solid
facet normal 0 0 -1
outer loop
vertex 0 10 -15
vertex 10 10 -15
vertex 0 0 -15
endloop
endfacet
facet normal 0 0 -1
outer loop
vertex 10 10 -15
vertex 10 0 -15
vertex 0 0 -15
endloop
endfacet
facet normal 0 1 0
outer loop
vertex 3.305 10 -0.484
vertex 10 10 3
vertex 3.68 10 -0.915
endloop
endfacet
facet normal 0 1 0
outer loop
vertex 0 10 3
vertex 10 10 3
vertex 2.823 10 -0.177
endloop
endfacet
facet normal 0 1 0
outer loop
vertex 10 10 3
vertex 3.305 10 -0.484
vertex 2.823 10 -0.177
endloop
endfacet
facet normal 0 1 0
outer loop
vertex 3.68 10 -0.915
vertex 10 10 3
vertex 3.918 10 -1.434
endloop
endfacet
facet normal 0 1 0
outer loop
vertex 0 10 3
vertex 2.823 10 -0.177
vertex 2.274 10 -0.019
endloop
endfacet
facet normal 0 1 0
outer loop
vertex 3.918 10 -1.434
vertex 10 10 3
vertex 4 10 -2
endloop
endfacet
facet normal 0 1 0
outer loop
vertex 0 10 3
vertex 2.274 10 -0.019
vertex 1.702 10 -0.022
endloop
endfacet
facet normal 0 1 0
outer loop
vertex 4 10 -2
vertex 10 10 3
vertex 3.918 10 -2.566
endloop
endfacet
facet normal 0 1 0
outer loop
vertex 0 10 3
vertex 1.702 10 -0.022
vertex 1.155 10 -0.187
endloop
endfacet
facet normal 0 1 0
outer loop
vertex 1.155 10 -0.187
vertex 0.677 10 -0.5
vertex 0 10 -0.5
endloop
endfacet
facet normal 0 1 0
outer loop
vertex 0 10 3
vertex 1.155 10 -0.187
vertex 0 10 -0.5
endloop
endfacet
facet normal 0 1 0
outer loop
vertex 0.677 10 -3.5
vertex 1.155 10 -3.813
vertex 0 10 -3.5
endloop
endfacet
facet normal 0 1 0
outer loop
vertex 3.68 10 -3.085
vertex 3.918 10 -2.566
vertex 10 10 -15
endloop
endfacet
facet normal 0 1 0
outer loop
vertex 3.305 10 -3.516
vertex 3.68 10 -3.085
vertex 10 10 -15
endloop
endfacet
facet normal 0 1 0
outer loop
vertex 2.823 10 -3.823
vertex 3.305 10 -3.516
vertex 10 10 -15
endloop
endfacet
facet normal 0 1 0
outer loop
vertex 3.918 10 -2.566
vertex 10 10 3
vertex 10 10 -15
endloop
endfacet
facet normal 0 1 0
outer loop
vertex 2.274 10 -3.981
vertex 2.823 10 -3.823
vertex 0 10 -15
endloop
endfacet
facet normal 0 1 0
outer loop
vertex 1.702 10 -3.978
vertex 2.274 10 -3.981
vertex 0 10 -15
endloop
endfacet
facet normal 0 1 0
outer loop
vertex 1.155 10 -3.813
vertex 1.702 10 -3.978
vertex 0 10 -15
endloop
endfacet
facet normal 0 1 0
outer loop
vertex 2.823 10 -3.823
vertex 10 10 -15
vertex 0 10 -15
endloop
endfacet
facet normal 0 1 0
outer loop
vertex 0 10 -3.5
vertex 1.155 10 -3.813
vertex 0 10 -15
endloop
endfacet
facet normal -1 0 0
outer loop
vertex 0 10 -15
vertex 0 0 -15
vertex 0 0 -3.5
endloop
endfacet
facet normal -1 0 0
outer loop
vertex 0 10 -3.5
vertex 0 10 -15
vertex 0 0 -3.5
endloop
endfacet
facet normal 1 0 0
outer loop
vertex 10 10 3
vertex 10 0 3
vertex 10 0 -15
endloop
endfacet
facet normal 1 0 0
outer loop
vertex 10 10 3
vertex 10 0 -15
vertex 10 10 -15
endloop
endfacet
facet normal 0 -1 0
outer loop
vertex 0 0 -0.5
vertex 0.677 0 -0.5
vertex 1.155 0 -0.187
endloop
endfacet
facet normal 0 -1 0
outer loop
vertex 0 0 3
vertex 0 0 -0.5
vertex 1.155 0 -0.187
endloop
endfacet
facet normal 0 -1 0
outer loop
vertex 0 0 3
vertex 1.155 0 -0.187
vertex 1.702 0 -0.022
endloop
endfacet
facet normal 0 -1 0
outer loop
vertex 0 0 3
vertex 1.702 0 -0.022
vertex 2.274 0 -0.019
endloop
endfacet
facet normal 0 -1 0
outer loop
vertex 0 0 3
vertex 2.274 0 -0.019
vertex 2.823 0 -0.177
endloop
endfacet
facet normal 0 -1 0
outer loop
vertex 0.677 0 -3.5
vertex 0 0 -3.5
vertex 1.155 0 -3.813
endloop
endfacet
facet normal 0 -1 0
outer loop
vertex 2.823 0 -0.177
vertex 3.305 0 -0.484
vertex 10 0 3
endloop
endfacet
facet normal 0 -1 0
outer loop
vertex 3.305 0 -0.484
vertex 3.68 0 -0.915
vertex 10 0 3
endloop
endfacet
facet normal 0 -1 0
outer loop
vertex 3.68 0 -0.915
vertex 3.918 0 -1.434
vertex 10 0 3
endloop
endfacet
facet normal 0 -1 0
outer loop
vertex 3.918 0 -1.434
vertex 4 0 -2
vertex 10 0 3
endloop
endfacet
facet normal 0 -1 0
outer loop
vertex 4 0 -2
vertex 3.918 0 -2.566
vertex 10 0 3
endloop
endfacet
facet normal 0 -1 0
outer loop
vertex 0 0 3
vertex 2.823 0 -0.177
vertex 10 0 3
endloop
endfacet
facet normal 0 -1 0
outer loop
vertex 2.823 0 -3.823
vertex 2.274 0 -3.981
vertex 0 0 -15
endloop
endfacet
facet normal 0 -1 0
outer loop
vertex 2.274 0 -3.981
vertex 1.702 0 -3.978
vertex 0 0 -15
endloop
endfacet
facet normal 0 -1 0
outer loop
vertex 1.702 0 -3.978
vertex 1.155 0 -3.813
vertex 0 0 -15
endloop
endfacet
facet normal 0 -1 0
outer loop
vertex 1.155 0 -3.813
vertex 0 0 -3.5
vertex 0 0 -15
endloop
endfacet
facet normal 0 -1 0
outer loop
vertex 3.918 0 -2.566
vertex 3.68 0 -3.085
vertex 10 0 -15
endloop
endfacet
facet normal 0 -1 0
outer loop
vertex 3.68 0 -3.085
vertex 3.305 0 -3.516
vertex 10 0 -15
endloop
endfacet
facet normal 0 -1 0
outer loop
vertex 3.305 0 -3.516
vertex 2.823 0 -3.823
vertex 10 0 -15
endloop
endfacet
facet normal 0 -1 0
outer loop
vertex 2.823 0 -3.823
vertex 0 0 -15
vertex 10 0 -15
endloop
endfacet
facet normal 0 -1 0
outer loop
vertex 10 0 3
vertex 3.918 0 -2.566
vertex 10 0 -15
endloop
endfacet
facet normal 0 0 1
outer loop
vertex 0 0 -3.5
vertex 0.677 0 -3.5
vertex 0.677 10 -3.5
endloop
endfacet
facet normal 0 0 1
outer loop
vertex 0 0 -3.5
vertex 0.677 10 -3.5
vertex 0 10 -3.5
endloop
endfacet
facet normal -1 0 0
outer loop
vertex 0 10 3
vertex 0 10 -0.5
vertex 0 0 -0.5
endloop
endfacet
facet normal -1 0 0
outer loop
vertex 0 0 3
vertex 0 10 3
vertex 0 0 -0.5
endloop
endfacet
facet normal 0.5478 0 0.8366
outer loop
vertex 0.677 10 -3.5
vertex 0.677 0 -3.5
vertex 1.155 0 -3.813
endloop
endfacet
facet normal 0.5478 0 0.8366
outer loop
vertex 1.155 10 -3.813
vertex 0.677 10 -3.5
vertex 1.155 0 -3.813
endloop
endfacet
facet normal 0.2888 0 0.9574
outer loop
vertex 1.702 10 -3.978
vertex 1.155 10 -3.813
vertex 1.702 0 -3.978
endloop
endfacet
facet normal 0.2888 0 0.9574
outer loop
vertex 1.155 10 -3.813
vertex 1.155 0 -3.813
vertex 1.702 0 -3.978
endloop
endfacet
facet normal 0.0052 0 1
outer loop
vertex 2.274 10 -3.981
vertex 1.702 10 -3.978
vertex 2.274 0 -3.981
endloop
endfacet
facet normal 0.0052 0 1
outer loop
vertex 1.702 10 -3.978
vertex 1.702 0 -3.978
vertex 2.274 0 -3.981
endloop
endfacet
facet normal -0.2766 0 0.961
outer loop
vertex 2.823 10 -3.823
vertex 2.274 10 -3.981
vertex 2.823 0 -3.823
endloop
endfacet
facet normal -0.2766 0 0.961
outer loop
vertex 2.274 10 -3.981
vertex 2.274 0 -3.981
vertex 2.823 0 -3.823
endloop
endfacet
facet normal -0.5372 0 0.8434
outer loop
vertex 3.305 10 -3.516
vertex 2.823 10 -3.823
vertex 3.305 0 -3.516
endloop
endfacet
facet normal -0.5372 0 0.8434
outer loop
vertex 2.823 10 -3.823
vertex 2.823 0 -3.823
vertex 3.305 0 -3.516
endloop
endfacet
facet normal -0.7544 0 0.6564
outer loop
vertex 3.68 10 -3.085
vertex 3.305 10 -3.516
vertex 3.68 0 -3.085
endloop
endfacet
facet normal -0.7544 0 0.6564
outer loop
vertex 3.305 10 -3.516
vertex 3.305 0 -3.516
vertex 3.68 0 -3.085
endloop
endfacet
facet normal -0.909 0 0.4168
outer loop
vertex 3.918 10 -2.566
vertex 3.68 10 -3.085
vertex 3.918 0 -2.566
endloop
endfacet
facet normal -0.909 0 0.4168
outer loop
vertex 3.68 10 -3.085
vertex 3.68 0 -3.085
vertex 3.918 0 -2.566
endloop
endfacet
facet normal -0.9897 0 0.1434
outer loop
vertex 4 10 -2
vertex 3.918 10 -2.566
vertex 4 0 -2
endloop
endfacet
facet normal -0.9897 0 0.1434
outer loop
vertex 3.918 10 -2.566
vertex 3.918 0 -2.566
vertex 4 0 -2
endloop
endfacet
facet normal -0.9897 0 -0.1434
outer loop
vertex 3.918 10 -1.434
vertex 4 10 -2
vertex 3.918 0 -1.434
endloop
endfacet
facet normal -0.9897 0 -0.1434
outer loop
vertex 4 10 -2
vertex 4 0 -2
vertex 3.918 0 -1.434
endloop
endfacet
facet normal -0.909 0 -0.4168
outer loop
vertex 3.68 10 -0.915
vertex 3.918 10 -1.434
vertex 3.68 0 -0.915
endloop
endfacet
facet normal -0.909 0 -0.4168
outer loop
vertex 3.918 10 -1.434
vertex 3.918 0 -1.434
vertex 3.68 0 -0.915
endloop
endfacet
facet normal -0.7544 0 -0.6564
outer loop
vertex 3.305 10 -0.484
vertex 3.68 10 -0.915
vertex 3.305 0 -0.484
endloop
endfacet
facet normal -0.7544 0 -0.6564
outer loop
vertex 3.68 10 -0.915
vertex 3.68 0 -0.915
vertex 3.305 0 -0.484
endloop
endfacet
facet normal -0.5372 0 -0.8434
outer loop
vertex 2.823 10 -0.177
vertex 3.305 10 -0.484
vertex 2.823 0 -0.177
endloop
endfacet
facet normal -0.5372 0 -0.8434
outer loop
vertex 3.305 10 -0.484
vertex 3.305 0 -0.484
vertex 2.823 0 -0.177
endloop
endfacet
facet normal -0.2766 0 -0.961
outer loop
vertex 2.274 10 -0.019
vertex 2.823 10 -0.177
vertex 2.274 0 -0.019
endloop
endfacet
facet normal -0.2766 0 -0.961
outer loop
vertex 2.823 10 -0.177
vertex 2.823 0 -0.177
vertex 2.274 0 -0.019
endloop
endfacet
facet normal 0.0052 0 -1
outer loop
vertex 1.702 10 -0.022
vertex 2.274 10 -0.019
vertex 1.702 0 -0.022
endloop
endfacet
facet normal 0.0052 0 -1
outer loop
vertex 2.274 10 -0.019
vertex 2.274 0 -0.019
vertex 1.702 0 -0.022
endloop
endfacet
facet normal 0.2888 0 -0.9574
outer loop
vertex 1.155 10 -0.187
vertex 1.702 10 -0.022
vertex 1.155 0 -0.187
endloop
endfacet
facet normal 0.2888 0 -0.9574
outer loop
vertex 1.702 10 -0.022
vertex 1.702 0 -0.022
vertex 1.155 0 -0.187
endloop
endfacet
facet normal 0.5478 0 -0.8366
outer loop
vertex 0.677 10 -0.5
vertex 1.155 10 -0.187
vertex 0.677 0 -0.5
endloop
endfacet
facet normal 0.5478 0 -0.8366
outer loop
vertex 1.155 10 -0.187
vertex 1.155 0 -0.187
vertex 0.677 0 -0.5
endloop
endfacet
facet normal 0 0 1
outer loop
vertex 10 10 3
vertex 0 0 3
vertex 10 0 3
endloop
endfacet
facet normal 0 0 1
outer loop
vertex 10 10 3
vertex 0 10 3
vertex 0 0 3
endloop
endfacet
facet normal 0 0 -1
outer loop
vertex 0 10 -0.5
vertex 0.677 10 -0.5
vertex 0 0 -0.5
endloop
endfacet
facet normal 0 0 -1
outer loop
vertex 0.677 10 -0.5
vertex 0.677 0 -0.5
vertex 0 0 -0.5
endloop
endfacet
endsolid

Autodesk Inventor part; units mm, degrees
ref_plane "YZ Plane" through (0, 0, 0) normal (1, 0, 0) x (0, 1, 0)
ref_plane "XZ Plane" through (0, 0, 0) normal (0, 1, 0) x (-1, 0, 0)
ref_plane "XY Plane" through (0, 0, 0) normal (0, 0, 1) x (1, 0, 0)
sketch "Sketch1" plane through (0, 0, 0) normal (0, 1, 0) x (-1, 0, 0)
  point P0 (0, 0)
sketch "Sketch2" plane through (0, 0, 0) normal (0, 1, 0) x (-1, 0, 0)
  line L0 (0, 0) -> (-5, 0)
  line L1 (-5, 0) -> (-5, -4)
  line L2 (-5, -4) -> (0, -4)
  line L3 (0, -4) -> (0, 0)
  line L4 (0, 0) -> (-10, 0)
  line L5 (-10, 0) -> (-10, -15)
  line L6 (-10, -15) -> (0, -15)
  line L7 (0, -15) -> (0, 0)
  circle A0 centre (-2, -2) radius 2
  line L8 (-5, 0) -> (-2, 0)
  line L9 (-2, 0) -> (-2, -4)
  line L10 (-2, -4) -> (-5, -4)
  line L11 (-5, -4) -> (-5, 0)
  point P0 (0, -2)
  dimension "d0" = 5
  dimension "d1" = 4
  dimension "d2" = 10
  dimension "d3" = 15
sketch "Sketch3" plane through (0, 0, 0) normal (0, 1, 0) x (-1, 0, 0)
  line L0 (0, 0) -> (0, -4.0004)
  line L1 (0, -4.0004) -> (0, -2.0004)
  line L2 (0, -4.0004) -> (-2.5, -4.0004)
  dimension "d4" = 2
  dimension "d5" = 2.5
extrude "Extrusion1" add sketch "Sketch2" along normal blind 10 contours L3 A0 L0 | A0 L2 L1 L0 | L3 L2 A0 | L1 L2 L7 L6 L5 L4
sketch "Sketch4" plane through (2, 0, 0) normal (0, 0, 1) x (1, 0, 0)
  line L0 (8, 0) -> (8, 10) projected
  line L1 (8, 10) -> (-2, 10)
  line L2 (-2, 10) -> (-2, 0)
  line L3 (-2, 0) -> (8, 0)
  line L4 (8, 0) -> (8, 10)
extrude "Extrusion2" add sketch "Sketch4" along normal blind 3
sketch "Sketch5" plane through (0, 0, 0) normal (0, -1, 0) x (1, 0, 0)
  line L0 (0, -15) -> (0, -2) projected
  line L1 (0, -0.3956) -> (0, -3.6044)
  line L2 (0, -3.666) -> (0, -0.334)
  line L3 (0, -2) -> (0, 3) projected
  line L4 (0, -0.334) -> (0, -3.666)
  point P0 (0, 0)
sketch "Sketch6" plane through (0, 0, 0) normal (0, -1, 0) x (1, 0, 0)
  line L0 (0, -15) -> (0, -2) projected
  line L1 (0, -2) -> (0.9417, -2)
  line L2 (0.9417, -2) -> (0.9417, -0.5)
  line L3 (0.9417, -0.5) -> (0, -0.5)
  line L4 (0, -0.5) -> (0, -2)
  circle A0 centre (2, -2) radius 2 projected
  line L5 (0, -2) -> (0.8653, -2)
  line L6 (0.8653, -2) -> (0.8653, -3.5)
  line L7 (0.8653, -3.5) -> (0, -3.5)
  line L8 (0, -3.5) -> (0, -2)
  point P0 (0, 0)
  dimension "d10" = 1.5
  dimension "d11" = 1.5
extrude "Extrusion3" cut sketch "Sketch6" against normal blind 20 contours L0 A0 L7 | L1 L6 L7 A0
sketch "Sketch7" plane through (0, 0, 0) normal (0, -1, 0) x (1, 0, 0)
  arc A0 (0.6771, -3.5) -> (0, -2) centre (2, -2) ccw projected
  line L0 (0, -2) -> (0.9289, -2)
  line L1 (0.9289, -2) -> (0.9289, -0.5)
  line L2 (0.9289, -0.5) -> (0, -0.5)
  line L3 (0, -0.5) -> (0, -2)
  point P0 (0, 0)
  point P1 (0.6771, -0.5)
  dimension "d14" = 1.5
extrude "Extrusion4" cut sketch "Sketch7" against normal blind 20 contours A0 L3 L2
sketch "Sketch8" plane through (0, 0, 0) normal (0, -1, 0) x (1, 0, 0)
  point P0 (0, 0)
